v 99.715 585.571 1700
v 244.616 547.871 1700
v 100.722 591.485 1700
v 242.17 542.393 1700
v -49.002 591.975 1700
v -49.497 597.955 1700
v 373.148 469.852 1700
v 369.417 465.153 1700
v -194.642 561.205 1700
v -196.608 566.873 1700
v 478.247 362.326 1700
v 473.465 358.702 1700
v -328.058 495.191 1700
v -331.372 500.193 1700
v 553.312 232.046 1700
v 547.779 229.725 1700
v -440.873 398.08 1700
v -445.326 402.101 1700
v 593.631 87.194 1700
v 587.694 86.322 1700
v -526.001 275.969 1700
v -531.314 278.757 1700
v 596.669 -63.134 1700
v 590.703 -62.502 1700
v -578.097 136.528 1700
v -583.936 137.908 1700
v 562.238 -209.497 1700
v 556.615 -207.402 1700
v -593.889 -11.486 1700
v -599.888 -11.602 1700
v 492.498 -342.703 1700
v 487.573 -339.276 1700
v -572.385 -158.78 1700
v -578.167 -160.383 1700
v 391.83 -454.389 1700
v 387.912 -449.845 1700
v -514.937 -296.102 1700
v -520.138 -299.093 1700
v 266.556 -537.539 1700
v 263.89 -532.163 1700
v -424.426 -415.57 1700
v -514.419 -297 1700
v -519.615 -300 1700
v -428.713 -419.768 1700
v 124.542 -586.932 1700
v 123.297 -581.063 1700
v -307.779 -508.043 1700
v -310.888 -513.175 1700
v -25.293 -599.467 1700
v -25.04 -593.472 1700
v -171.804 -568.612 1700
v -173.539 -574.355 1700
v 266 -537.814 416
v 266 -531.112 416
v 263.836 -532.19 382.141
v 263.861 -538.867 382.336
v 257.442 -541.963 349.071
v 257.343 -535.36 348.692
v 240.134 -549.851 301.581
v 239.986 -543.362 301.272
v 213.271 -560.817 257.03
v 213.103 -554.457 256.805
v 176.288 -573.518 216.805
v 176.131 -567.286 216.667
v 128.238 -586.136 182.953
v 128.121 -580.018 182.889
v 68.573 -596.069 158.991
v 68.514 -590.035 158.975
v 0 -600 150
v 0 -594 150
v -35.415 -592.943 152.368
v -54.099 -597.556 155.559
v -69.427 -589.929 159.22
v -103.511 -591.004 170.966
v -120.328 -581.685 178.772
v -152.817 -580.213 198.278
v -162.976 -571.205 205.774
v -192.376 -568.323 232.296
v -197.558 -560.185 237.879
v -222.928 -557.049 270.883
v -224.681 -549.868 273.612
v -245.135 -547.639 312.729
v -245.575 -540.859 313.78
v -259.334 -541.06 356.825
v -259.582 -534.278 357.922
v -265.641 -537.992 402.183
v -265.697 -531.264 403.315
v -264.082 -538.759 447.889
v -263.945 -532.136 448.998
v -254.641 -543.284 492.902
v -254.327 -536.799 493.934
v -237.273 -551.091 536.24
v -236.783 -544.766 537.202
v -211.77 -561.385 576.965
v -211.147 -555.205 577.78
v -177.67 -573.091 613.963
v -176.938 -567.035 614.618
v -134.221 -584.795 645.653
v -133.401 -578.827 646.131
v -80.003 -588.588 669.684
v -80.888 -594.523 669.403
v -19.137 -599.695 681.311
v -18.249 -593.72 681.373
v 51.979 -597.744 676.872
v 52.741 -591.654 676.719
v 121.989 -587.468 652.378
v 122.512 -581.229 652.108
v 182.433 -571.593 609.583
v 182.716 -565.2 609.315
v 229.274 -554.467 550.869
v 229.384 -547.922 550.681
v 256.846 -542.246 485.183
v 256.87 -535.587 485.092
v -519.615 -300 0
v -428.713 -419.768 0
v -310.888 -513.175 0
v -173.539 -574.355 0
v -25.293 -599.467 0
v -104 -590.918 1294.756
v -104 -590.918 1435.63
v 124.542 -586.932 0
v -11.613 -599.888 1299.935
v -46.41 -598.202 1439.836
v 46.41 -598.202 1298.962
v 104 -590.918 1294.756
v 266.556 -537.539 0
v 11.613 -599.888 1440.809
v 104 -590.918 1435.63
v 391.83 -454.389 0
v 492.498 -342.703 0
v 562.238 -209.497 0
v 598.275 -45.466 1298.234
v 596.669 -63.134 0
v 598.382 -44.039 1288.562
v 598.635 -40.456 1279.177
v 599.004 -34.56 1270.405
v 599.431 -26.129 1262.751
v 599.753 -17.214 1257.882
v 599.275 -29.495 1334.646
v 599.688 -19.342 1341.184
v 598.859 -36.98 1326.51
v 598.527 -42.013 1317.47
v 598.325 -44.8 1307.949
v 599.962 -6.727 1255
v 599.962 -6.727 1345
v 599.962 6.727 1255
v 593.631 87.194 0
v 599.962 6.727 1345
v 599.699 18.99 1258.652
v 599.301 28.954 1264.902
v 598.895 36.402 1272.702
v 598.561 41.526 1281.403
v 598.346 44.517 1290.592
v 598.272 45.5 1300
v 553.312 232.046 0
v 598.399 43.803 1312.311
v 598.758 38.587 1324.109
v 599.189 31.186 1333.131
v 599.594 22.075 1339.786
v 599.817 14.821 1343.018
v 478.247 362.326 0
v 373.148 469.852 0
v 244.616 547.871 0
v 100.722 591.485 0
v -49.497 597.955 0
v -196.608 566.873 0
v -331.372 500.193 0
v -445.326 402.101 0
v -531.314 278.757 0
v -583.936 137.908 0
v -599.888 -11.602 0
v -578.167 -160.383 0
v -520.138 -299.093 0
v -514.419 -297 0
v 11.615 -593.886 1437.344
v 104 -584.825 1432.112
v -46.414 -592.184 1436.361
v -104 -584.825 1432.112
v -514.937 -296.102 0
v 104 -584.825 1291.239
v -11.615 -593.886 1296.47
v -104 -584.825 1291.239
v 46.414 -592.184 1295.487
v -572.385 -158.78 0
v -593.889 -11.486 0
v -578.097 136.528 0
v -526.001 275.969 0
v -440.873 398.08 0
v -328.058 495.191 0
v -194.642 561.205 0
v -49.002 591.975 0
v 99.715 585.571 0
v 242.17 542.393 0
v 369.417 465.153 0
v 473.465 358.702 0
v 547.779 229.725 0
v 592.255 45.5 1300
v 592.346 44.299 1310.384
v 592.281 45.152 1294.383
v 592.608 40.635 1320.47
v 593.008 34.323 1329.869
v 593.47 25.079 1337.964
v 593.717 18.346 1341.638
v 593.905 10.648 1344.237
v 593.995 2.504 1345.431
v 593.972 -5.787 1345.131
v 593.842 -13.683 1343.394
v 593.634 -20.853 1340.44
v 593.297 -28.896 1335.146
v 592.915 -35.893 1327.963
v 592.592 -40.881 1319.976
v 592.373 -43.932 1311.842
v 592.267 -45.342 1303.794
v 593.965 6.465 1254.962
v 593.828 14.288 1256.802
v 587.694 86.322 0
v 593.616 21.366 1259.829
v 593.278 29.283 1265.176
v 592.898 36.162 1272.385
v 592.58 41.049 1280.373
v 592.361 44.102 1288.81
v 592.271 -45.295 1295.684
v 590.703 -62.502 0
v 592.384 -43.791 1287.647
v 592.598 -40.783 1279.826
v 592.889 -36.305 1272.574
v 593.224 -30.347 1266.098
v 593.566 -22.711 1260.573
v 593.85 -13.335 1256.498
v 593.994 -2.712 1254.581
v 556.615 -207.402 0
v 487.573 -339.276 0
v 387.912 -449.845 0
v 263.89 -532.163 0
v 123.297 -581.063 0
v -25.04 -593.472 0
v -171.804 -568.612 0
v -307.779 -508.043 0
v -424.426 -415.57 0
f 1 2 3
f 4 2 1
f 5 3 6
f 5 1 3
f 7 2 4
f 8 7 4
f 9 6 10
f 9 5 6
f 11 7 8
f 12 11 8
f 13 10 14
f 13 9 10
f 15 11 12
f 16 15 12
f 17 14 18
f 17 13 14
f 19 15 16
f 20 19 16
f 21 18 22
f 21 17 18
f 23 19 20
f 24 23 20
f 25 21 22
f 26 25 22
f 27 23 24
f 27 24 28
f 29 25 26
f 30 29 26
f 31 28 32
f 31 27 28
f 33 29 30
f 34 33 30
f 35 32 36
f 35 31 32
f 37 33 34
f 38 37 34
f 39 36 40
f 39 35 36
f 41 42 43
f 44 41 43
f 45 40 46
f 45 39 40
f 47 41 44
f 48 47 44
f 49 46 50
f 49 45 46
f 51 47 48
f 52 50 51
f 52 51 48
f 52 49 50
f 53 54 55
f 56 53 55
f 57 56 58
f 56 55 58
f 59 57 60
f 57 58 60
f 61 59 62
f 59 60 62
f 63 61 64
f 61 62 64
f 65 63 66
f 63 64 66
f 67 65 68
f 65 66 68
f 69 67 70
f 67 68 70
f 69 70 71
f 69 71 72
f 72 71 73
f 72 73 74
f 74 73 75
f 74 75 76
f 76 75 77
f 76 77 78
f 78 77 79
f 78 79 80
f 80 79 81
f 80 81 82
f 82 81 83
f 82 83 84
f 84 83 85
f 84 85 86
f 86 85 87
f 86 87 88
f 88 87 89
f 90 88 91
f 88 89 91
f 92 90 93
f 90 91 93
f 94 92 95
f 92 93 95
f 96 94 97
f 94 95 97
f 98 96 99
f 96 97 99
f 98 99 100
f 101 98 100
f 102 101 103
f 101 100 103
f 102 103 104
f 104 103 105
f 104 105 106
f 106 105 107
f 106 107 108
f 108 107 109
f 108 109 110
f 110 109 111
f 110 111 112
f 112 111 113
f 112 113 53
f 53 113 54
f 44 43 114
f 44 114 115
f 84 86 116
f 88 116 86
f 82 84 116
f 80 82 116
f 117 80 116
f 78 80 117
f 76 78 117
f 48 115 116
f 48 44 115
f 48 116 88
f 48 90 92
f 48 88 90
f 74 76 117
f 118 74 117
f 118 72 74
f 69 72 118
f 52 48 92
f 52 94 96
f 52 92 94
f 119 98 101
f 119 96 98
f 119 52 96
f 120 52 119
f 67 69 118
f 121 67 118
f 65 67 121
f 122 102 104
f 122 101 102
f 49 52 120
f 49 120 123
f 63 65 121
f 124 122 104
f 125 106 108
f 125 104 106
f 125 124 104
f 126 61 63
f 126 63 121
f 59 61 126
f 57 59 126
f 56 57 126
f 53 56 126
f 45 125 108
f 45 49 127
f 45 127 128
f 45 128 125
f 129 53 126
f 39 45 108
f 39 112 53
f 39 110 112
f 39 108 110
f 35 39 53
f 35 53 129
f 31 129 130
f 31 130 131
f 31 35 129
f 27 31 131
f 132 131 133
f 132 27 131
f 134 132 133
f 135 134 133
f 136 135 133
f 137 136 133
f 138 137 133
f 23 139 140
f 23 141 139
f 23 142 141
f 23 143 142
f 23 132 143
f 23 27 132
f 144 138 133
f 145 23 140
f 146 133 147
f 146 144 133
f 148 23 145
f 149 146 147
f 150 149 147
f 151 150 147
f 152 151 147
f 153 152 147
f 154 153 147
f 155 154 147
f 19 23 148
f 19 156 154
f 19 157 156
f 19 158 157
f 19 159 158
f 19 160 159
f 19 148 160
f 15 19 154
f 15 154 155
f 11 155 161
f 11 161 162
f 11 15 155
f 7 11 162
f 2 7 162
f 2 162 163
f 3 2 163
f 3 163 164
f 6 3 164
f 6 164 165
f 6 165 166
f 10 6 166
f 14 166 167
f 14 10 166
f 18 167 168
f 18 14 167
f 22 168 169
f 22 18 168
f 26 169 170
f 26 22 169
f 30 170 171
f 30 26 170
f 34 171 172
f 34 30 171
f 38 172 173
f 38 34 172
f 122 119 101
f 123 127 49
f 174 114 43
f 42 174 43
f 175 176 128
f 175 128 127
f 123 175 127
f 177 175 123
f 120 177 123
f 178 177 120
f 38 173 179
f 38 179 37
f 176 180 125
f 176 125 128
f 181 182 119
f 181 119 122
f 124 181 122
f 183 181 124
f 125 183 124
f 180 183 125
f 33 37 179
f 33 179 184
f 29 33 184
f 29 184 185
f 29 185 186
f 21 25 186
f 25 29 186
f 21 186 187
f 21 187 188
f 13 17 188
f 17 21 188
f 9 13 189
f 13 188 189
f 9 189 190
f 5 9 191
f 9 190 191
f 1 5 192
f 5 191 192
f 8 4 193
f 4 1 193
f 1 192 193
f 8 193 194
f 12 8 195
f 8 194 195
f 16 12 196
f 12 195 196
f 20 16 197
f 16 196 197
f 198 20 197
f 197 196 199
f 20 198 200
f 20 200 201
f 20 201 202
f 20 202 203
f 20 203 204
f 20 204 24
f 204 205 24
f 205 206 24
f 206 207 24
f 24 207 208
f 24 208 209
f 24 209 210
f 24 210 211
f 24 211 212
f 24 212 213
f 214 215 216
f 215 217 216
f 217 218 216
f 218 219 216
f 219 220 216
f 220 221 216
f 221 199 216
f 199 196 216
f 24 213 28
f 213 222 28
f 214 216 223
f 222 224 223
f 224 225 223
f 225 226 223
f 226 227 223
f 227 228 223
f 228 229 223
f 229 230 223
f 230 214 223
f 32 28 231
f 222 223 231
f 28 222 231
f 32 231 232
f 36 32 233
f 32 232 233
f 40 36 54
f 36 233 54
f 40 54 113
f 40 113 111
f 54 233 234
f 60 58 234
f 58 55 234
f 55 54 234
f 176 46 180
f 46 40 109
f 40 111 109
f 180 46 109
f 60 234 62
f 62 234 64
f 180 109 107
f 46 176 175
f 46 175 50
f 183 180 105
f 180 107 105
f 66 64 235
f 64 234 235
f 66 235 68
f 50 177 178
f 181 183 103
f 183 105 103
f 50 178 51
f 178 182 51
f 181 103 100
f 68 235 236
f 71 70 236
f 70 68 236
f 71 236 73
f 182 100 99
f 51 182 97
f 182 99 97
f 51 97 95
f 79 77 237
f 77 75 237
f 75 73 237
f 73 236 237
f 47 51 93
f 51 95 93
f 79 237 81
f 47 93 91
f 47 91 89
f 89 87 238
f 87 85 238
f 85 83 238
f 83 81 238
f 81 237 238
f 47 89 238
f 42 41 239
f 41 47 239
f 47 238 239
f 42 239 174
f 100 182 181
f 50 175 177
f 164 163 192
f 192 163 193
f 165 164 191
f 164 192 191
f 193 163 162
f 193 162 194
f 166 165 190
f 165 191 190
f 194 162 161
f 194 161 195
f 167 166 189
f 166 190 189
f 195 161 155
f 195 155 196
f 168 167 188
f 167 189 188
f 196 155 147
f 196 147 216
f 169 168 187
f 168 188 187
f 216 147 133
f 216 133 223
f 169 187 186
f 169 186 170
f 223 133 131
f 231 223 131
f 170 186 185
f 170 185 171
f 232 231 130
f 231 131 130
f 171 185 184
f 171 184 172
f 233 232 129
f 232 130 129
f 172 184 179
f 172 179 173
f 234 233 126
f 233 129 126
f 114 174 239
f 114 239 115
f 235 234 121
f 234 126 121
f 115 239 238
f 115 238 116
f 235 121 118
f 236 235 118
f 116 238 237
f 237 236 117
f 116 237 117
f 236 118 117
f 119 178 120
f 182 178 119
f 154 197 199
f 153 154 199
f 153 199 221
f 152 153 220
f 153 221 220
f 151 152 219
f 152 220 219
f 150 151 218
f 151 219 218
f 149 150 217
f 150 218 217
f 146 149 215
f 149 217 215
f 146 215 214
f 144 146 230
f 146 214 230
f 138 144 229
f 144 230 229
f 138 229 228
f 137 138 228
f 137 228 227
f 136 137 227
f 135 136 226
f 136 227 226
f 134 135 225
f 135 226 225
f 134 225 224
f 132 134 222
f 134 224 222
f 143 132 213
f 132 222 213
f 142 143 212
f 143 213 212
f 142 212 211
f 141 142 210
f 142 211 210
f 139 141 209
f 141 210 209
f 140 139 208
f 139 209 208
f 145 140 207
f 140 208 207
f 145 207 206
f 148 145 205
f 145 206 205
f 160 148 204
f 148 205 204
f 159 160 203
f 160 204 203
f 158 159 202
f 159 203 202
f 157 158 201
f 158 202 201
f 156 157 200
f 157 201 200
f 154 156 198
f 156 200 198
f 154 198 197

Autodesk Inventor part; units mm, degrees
sketch "Sketch13" plane through (0, 0, 0) normal (0, 0, 1) x (1, 0, 0)
  circle A0 centre (0, 0) radius 600 construction
  line L0 (0, 0) -> (0, -600)
  line L1 (0, 0) -> (-519.6152, -300)
  line L2 (0, 0) -> (600, 0)
  line L3 (0, 0) -> (0, -600)
  line L4 (0, 0) -> (0, -600)
  line L5 (0, 0) -> (534.6039, 272.3943)
  line L6 (0, 0) -> (0, 600)
  dimension "d53" = 1200
  dimension "d55" = 0
  dimension "d98" = 180
  dimension "d99" = 240
  dimension "d100" = 63
  dimension "d101" = 90
ref_plane "WeldJoint" through (0, 0, -10) normal (0.5, -0.866, 0) x (0, 0, 1)
ref_plane "Inlet_Clock_Angle_plane" through (0, 0, -10) normal (0, 1, 0) x (0, 0, 1)
ref_plane "Charging" through (0, 0, -10) normal (1, 0, 0) x (0, 0, 1)
ref_plane "Accsess" through (0, 0, -10) normal (1, 0, 0) x (0, 0, 1)
sketch "Sketch14" plane through (0, 0, -10) normal (0.5, -0.866, 0) x (0, 0, 1)
  line L0 (1710, 594) -> (10, 594)
  line L1 (10, 594) -> (10, 600)
  line L2 (10, 600) -> (1710, 600)
  line L3 (1710, 600) -> (1710, 594)
  line L4 (10, 0) -> (1710, 0)
  line L5 (10, 600) -> (-20, 600) construction
  line L6 (10, 594) -> (-20, 594) construction
  arc A0 (-20, 594) -> (-109.2789, 539.0476) centre (-20, 494) ccw construction
  arc A1 (-109.2789, 539.0476) -> (-234, 15) centre (929.3202, 15) ccw construction
  line L7 (-234, 15) -> (-234, 0) construction
  line L8 (10, 0) -> (-234, 0) construction
  arc A2 (-20, 600) -> (-114.6356, 541.7504) centre (-20, 494) ccw construction
  arc A3 (-114.6356, 541.7504) -> (-240, 15) centre (929.3202, 15) ccw construction
  line L9 (-240, 15) -> (-240, 0) construction
  line L10 (-234, 0) -> (-240, 0) construction
  line L11 (1710, 594) -> (1740, 594)
  line L12 (1710, 600) -> (1740, 600)
  line L13 (1710, 0) -> (1954, 0) construction
  line L14 (1960, 0) -> (1960, 15) construction
  arc A4 (1960, 15) -> (1834.6356, 541.7504) centre (790.6798, 15) ccw construction
  arc A5 (1834.6356, 541.7504) -> (1740, 600) centre (1740, 494) ccw construction
  line L15 (1954, 0) -> (1954, 15) construction
  line L16 (1954, 0) -> (1960, 0) construction
  arc A6 (1954, 15) -> (1829.2789, 539.0476) centre (790.6798, 15) ccw construction
  arc A7 (1829.2789, 539.0476) -> (1740, 594) centre (1740, 494) ccw construction
  line L17 (-160.8038, 520) -> (-540, 520)
  line L18 (-540, 520) -> (-540, 440)
  line L19 (-540, 440) -> (-160.8038, 440)
  line L20 (-160.8038, 440) -> (-160.8038, 520)
  line L21 (1960, 15) -> (1990, 15) construction
  line L22 (1990, 15) -> (1990, 0) construction
  line L23 (1990, 0) -> (1960, 0) construction
  line L24 (-540, 600) -> (-540, 520)
  line L25 (-540, 600) -> (-534, 600)
  line L26 (-534, 600) -> (-534, 520)
  line L27 (-120.3984, 533.7757) -> (-168.7178, 421.6324)
  line L28 (-160.8038, 520) -> (-126.334, 520)
  line L29 (-109.2789, 539.0476) -> (-114.6356, 541.7504)
  line L30 (-120.3984, 533.7757) -> (-116.5468, 542.7148) construction
  line L31 (-116.5468, 542.7148) -> (-114.6356, 541.7504) construction
  line L32 (-540, 600) -> (-540, 600)
  line L33 (-540, 600) -> (-540, 440)
  line L34 (-540, 440) -> (-540, 440)
  line L35 (1355, 600) -> (1265, 600)
  line L36 (1265, 600) -> (1265, 700)
  line L37 (1265, 700) -> (1355, 700)
  line L38 (1355, 700) -> (1355, 600)
  point P0 (10, 597)
  point P1 (-144.5581, 477.7041)
  point P2 (1310, 700)
  dimension "d59" = 1700
  dimension "d60" = 6
  dimension "d61" = 1200
  dimension "d82" = 100
  dimension "d83" = 30
  dimension "d86" = 80
  dimension "d87" = 30
  dimension "d91" = 15
  dimension "d92" = 20
  dimension "d93" = 250
  dimension "d94" = 30
  dimension "d103" = 413.666
  dimension "d104" = 23.31
  dimension "d105" = 122.1101
  dimension "d107" = 9.7336
  dimension "d108" = 880
  dimension "d109" = 0
  dimension "d110" = 2530
  dimension "d111" = 300
  dimension "d112" = 100
  dimension "d113" = 90
  dimension "d114" = 1850
  dimension "d115" = 1300
  dimension "d116" = 80
revolve "Revolution2" add sketch "Sketch14" angle 359.9 about axis through (0, 0, 0) along (0, 0, 1) contours L0 L1 L2 L3
sketch "Sketch AnglePlane_InletPipe" plane through (0, 0, -10) normal (0, 1, 0) x (0, 0, 1)
  line L0 (10, -600) -> (10, 600) projected
  line L1 (10, 0) -> (1310, 0)
  line L2 (1310, 0) -> (1310, 600)
  line L3 (1310, 600) -> (10, 600)
  line L4 (10, 600) -> (10, 0)
  point P0 (10, -519.6152)
  point P1 (10, -520.138)
  dimension "d63" = 1200
  dimension "d64" = 90
  dimension "frd_hght" = 1300
ref_plane "InletPipe_AnglePlane" through (0, 0, 1300) normal (1, 0, 0) x (0, 1, 0)
sketch "Sketch16" plane through (0, 0, 1300) normal (1, 0, 0) x (0, 1, 0)
  circle A0 centre (0, 0) radius 45.5
  point P0 (0, -1300)
  point P1 (0, 0)
  point P2 (0, 0)
  point P3 (0, 0)
  dimension "d66" = 91
extrude "Extrusion7" cut sketch "Sketch16" along normal through all
ref_plane "Work Plane16" through (0, 0, 0) normal (0, -1, 0) x (1, 0, 0)
sketch "Sketch17" plane through (0, 0, 0) normal (0, -1, 0) x (1, 0, 0)
  circle A0 centre (0, 416) radius 266
  line L0 (0, 150) -> (-495.5727, 150)
  point P0 (0, 0)
  dimension "d69" = 532
  dimension "d71" = 150
extrude "Extrusion8" cut sketch "Sketch17" along normal through all
sketch "ChargingAngleSketch19" plane through (0, 0, -10) normal (1, 0, 0) x (0, 0, 1)
  line L0 (10, 0) -> (963.5898, 0)
  line L1 (963.5898, 0) -> (1310, 600)
  line L2 (1310, 600) -> (10, 600)
  line L3 (10, 600) -> (10, 0)
  dimension "d74" = 1300
  dimension "d76" = 1200
  dimension "d77" = 60
ref_plane "Work Plane18" through (0, 0, 953.5898) normal (0, -0.866, 0.5) x (1, 0, 0)
sketch "Sketch20" plane through (0, 0, 953.5898) normal (0, -0.866, 0.5) x (1, 0, 0)
  line L0 (-104, 0) -> (104, 0)
  line L1 (104, 0) -> (104, 122)
  line L2 (104, 122) -> (-104, 122)
  line L3 (-104, 122) -> (-104, 0)
  point P0 (0, -825.833)
  point P1 (0, 0)
  point P2 (0, 0)
  point P3 (0, 0)
  point P4 (0, 0)
  dimension "d78" = 208
  dimension "d79" = 122
extrude "Charging hole" cut sketch "Sketch20" along normal through all
sketch "Sketch1" plane through (0, -1700, 0) normal (0, 0, 1) x (1, 0, 0)
  line L0 (520.8574, 1294.7565) -> (520.8574, 1435.6299) projected
  line L1 (728.7425, 1435.6299) -> (728.7425, 1294.7565) projected
  line L2 (532.8574, 1424.7204) -> (532.8574, 1307.9421)
  line L3 (716.7425, 1307.9421) -> (716.7425, 1424.7204)
  line L4 (624.7999, 682) -> (624.7999, 150) construction
  line L5 (350.7548, 416) -> (898.8451, 416) construction
  line L6 (1728.1139, 1564.2642) -> (1182.3519, -339.0339)
  line L7 (1182.3519, -339.0339) -> (0, 0)
  line L8 (0, 0) -> (545.762, 1903.2982)
  line L9 (545.762, 1903.2982) -> (1728.1139, 1564.2642)
  line L10 (1728.1139, 1564.2642) -> (0, 0) construction
  line L11 (1182.3519, -339.0339) -> (545.762, 1903.2982) construction
  line L12 (0, 0) -> (1279.5683, 0)
  line L13 (0, 1700) -> (0, 0) projected
  line L14 (0, 0) -> (3747.7583, 0) projected
  line L15 (0, 1700) -> (3747.7583, 1700) projected
  line L16 (3747.7583, 1700) -> (3747.7583, 0) projected
  ellipse E0 centre (624.7999, 416) end of major axis (624.7999, 150) minor radius 279
  line L17 (509.8574, 1445.5785) -> (509.8574, 1282.5939)
  line L18 (739.7425, 1282.5939) -> (739.7425, 1445.5785)
  point P0 (864.0569, 782.1321)
  point P1 (1516.7112, 1300)
  point P2 (1607.2885, 1300)
  point P3 (1595.2885, 1300)
  point P4 (1528.7112, 1300)
  point P5 (1254.7469, 1700)
  point P6 (487.4672, 1700)
  point P7 (729.8034, 1432.112)
  point P8 (519.7965, 1432.112)
  point P9 (520.8574, 1432.2183)
  point P10 (728.7425, 1432.2183)
  point P11 (1618.2885, 1300)
  point P12 (1505.7112, 1300)
  dimension "d0" = 12
  dimension "d10" = 12
  dimension "d13" = 279
  dimension "d15" = 11
  dimension "d16" = 11
  dimension "d17" = 11
  dimension "d3" = 532
  dimension "d4" = 548.0902
  dimension "d6" = 1980
  dimension "d8" = 1230
  dimension "d9" = 16
  dimension "d14" = 12
equation "\"BendRadius\" = Thickness"
equation "\"BendReliefWidth\" = Thickness"
equation "\"BendReliefDepth\" = 0.5 * Thickness"
equation "\"CornerReliefSize\" = 4 * Thickness"
equation "\"MinimumRemnant\" = 2 * Thickness"
equation "\"TransitionRadius\" = BendRadius"
equation "\"JacobiRadiusSize\" = BendRadius"
equation "\"GapSize\" = Thickness"
equation "\"InletPipe_horisont_angle\" = 0"
equation "\"ChargingHatch_width\" = 208"
equation "\"ChargingHatch_hight\" = 122"
equation "\"AccsessHatch_ClockAngle\" = 0"
equation "\"ChargingHatch_ClockAgnle\" = 180deg"
equation "\"InletPipe_Clock_angle\" = 90deg"
equation "\"OutletPipe_ClockAngle\" = 63deg"
equation "\"WeldJoint_ClockAgnle\" = 240deg"
equation "\"Legs_Tube_lenght\" = 413.666"
equation "\"Legs_Upper_plate_lenght\" = 122.11007"
equation "\"Thickness\" = 6"
properties part number "PRS 0101 main shell D1200" material "Steel"
